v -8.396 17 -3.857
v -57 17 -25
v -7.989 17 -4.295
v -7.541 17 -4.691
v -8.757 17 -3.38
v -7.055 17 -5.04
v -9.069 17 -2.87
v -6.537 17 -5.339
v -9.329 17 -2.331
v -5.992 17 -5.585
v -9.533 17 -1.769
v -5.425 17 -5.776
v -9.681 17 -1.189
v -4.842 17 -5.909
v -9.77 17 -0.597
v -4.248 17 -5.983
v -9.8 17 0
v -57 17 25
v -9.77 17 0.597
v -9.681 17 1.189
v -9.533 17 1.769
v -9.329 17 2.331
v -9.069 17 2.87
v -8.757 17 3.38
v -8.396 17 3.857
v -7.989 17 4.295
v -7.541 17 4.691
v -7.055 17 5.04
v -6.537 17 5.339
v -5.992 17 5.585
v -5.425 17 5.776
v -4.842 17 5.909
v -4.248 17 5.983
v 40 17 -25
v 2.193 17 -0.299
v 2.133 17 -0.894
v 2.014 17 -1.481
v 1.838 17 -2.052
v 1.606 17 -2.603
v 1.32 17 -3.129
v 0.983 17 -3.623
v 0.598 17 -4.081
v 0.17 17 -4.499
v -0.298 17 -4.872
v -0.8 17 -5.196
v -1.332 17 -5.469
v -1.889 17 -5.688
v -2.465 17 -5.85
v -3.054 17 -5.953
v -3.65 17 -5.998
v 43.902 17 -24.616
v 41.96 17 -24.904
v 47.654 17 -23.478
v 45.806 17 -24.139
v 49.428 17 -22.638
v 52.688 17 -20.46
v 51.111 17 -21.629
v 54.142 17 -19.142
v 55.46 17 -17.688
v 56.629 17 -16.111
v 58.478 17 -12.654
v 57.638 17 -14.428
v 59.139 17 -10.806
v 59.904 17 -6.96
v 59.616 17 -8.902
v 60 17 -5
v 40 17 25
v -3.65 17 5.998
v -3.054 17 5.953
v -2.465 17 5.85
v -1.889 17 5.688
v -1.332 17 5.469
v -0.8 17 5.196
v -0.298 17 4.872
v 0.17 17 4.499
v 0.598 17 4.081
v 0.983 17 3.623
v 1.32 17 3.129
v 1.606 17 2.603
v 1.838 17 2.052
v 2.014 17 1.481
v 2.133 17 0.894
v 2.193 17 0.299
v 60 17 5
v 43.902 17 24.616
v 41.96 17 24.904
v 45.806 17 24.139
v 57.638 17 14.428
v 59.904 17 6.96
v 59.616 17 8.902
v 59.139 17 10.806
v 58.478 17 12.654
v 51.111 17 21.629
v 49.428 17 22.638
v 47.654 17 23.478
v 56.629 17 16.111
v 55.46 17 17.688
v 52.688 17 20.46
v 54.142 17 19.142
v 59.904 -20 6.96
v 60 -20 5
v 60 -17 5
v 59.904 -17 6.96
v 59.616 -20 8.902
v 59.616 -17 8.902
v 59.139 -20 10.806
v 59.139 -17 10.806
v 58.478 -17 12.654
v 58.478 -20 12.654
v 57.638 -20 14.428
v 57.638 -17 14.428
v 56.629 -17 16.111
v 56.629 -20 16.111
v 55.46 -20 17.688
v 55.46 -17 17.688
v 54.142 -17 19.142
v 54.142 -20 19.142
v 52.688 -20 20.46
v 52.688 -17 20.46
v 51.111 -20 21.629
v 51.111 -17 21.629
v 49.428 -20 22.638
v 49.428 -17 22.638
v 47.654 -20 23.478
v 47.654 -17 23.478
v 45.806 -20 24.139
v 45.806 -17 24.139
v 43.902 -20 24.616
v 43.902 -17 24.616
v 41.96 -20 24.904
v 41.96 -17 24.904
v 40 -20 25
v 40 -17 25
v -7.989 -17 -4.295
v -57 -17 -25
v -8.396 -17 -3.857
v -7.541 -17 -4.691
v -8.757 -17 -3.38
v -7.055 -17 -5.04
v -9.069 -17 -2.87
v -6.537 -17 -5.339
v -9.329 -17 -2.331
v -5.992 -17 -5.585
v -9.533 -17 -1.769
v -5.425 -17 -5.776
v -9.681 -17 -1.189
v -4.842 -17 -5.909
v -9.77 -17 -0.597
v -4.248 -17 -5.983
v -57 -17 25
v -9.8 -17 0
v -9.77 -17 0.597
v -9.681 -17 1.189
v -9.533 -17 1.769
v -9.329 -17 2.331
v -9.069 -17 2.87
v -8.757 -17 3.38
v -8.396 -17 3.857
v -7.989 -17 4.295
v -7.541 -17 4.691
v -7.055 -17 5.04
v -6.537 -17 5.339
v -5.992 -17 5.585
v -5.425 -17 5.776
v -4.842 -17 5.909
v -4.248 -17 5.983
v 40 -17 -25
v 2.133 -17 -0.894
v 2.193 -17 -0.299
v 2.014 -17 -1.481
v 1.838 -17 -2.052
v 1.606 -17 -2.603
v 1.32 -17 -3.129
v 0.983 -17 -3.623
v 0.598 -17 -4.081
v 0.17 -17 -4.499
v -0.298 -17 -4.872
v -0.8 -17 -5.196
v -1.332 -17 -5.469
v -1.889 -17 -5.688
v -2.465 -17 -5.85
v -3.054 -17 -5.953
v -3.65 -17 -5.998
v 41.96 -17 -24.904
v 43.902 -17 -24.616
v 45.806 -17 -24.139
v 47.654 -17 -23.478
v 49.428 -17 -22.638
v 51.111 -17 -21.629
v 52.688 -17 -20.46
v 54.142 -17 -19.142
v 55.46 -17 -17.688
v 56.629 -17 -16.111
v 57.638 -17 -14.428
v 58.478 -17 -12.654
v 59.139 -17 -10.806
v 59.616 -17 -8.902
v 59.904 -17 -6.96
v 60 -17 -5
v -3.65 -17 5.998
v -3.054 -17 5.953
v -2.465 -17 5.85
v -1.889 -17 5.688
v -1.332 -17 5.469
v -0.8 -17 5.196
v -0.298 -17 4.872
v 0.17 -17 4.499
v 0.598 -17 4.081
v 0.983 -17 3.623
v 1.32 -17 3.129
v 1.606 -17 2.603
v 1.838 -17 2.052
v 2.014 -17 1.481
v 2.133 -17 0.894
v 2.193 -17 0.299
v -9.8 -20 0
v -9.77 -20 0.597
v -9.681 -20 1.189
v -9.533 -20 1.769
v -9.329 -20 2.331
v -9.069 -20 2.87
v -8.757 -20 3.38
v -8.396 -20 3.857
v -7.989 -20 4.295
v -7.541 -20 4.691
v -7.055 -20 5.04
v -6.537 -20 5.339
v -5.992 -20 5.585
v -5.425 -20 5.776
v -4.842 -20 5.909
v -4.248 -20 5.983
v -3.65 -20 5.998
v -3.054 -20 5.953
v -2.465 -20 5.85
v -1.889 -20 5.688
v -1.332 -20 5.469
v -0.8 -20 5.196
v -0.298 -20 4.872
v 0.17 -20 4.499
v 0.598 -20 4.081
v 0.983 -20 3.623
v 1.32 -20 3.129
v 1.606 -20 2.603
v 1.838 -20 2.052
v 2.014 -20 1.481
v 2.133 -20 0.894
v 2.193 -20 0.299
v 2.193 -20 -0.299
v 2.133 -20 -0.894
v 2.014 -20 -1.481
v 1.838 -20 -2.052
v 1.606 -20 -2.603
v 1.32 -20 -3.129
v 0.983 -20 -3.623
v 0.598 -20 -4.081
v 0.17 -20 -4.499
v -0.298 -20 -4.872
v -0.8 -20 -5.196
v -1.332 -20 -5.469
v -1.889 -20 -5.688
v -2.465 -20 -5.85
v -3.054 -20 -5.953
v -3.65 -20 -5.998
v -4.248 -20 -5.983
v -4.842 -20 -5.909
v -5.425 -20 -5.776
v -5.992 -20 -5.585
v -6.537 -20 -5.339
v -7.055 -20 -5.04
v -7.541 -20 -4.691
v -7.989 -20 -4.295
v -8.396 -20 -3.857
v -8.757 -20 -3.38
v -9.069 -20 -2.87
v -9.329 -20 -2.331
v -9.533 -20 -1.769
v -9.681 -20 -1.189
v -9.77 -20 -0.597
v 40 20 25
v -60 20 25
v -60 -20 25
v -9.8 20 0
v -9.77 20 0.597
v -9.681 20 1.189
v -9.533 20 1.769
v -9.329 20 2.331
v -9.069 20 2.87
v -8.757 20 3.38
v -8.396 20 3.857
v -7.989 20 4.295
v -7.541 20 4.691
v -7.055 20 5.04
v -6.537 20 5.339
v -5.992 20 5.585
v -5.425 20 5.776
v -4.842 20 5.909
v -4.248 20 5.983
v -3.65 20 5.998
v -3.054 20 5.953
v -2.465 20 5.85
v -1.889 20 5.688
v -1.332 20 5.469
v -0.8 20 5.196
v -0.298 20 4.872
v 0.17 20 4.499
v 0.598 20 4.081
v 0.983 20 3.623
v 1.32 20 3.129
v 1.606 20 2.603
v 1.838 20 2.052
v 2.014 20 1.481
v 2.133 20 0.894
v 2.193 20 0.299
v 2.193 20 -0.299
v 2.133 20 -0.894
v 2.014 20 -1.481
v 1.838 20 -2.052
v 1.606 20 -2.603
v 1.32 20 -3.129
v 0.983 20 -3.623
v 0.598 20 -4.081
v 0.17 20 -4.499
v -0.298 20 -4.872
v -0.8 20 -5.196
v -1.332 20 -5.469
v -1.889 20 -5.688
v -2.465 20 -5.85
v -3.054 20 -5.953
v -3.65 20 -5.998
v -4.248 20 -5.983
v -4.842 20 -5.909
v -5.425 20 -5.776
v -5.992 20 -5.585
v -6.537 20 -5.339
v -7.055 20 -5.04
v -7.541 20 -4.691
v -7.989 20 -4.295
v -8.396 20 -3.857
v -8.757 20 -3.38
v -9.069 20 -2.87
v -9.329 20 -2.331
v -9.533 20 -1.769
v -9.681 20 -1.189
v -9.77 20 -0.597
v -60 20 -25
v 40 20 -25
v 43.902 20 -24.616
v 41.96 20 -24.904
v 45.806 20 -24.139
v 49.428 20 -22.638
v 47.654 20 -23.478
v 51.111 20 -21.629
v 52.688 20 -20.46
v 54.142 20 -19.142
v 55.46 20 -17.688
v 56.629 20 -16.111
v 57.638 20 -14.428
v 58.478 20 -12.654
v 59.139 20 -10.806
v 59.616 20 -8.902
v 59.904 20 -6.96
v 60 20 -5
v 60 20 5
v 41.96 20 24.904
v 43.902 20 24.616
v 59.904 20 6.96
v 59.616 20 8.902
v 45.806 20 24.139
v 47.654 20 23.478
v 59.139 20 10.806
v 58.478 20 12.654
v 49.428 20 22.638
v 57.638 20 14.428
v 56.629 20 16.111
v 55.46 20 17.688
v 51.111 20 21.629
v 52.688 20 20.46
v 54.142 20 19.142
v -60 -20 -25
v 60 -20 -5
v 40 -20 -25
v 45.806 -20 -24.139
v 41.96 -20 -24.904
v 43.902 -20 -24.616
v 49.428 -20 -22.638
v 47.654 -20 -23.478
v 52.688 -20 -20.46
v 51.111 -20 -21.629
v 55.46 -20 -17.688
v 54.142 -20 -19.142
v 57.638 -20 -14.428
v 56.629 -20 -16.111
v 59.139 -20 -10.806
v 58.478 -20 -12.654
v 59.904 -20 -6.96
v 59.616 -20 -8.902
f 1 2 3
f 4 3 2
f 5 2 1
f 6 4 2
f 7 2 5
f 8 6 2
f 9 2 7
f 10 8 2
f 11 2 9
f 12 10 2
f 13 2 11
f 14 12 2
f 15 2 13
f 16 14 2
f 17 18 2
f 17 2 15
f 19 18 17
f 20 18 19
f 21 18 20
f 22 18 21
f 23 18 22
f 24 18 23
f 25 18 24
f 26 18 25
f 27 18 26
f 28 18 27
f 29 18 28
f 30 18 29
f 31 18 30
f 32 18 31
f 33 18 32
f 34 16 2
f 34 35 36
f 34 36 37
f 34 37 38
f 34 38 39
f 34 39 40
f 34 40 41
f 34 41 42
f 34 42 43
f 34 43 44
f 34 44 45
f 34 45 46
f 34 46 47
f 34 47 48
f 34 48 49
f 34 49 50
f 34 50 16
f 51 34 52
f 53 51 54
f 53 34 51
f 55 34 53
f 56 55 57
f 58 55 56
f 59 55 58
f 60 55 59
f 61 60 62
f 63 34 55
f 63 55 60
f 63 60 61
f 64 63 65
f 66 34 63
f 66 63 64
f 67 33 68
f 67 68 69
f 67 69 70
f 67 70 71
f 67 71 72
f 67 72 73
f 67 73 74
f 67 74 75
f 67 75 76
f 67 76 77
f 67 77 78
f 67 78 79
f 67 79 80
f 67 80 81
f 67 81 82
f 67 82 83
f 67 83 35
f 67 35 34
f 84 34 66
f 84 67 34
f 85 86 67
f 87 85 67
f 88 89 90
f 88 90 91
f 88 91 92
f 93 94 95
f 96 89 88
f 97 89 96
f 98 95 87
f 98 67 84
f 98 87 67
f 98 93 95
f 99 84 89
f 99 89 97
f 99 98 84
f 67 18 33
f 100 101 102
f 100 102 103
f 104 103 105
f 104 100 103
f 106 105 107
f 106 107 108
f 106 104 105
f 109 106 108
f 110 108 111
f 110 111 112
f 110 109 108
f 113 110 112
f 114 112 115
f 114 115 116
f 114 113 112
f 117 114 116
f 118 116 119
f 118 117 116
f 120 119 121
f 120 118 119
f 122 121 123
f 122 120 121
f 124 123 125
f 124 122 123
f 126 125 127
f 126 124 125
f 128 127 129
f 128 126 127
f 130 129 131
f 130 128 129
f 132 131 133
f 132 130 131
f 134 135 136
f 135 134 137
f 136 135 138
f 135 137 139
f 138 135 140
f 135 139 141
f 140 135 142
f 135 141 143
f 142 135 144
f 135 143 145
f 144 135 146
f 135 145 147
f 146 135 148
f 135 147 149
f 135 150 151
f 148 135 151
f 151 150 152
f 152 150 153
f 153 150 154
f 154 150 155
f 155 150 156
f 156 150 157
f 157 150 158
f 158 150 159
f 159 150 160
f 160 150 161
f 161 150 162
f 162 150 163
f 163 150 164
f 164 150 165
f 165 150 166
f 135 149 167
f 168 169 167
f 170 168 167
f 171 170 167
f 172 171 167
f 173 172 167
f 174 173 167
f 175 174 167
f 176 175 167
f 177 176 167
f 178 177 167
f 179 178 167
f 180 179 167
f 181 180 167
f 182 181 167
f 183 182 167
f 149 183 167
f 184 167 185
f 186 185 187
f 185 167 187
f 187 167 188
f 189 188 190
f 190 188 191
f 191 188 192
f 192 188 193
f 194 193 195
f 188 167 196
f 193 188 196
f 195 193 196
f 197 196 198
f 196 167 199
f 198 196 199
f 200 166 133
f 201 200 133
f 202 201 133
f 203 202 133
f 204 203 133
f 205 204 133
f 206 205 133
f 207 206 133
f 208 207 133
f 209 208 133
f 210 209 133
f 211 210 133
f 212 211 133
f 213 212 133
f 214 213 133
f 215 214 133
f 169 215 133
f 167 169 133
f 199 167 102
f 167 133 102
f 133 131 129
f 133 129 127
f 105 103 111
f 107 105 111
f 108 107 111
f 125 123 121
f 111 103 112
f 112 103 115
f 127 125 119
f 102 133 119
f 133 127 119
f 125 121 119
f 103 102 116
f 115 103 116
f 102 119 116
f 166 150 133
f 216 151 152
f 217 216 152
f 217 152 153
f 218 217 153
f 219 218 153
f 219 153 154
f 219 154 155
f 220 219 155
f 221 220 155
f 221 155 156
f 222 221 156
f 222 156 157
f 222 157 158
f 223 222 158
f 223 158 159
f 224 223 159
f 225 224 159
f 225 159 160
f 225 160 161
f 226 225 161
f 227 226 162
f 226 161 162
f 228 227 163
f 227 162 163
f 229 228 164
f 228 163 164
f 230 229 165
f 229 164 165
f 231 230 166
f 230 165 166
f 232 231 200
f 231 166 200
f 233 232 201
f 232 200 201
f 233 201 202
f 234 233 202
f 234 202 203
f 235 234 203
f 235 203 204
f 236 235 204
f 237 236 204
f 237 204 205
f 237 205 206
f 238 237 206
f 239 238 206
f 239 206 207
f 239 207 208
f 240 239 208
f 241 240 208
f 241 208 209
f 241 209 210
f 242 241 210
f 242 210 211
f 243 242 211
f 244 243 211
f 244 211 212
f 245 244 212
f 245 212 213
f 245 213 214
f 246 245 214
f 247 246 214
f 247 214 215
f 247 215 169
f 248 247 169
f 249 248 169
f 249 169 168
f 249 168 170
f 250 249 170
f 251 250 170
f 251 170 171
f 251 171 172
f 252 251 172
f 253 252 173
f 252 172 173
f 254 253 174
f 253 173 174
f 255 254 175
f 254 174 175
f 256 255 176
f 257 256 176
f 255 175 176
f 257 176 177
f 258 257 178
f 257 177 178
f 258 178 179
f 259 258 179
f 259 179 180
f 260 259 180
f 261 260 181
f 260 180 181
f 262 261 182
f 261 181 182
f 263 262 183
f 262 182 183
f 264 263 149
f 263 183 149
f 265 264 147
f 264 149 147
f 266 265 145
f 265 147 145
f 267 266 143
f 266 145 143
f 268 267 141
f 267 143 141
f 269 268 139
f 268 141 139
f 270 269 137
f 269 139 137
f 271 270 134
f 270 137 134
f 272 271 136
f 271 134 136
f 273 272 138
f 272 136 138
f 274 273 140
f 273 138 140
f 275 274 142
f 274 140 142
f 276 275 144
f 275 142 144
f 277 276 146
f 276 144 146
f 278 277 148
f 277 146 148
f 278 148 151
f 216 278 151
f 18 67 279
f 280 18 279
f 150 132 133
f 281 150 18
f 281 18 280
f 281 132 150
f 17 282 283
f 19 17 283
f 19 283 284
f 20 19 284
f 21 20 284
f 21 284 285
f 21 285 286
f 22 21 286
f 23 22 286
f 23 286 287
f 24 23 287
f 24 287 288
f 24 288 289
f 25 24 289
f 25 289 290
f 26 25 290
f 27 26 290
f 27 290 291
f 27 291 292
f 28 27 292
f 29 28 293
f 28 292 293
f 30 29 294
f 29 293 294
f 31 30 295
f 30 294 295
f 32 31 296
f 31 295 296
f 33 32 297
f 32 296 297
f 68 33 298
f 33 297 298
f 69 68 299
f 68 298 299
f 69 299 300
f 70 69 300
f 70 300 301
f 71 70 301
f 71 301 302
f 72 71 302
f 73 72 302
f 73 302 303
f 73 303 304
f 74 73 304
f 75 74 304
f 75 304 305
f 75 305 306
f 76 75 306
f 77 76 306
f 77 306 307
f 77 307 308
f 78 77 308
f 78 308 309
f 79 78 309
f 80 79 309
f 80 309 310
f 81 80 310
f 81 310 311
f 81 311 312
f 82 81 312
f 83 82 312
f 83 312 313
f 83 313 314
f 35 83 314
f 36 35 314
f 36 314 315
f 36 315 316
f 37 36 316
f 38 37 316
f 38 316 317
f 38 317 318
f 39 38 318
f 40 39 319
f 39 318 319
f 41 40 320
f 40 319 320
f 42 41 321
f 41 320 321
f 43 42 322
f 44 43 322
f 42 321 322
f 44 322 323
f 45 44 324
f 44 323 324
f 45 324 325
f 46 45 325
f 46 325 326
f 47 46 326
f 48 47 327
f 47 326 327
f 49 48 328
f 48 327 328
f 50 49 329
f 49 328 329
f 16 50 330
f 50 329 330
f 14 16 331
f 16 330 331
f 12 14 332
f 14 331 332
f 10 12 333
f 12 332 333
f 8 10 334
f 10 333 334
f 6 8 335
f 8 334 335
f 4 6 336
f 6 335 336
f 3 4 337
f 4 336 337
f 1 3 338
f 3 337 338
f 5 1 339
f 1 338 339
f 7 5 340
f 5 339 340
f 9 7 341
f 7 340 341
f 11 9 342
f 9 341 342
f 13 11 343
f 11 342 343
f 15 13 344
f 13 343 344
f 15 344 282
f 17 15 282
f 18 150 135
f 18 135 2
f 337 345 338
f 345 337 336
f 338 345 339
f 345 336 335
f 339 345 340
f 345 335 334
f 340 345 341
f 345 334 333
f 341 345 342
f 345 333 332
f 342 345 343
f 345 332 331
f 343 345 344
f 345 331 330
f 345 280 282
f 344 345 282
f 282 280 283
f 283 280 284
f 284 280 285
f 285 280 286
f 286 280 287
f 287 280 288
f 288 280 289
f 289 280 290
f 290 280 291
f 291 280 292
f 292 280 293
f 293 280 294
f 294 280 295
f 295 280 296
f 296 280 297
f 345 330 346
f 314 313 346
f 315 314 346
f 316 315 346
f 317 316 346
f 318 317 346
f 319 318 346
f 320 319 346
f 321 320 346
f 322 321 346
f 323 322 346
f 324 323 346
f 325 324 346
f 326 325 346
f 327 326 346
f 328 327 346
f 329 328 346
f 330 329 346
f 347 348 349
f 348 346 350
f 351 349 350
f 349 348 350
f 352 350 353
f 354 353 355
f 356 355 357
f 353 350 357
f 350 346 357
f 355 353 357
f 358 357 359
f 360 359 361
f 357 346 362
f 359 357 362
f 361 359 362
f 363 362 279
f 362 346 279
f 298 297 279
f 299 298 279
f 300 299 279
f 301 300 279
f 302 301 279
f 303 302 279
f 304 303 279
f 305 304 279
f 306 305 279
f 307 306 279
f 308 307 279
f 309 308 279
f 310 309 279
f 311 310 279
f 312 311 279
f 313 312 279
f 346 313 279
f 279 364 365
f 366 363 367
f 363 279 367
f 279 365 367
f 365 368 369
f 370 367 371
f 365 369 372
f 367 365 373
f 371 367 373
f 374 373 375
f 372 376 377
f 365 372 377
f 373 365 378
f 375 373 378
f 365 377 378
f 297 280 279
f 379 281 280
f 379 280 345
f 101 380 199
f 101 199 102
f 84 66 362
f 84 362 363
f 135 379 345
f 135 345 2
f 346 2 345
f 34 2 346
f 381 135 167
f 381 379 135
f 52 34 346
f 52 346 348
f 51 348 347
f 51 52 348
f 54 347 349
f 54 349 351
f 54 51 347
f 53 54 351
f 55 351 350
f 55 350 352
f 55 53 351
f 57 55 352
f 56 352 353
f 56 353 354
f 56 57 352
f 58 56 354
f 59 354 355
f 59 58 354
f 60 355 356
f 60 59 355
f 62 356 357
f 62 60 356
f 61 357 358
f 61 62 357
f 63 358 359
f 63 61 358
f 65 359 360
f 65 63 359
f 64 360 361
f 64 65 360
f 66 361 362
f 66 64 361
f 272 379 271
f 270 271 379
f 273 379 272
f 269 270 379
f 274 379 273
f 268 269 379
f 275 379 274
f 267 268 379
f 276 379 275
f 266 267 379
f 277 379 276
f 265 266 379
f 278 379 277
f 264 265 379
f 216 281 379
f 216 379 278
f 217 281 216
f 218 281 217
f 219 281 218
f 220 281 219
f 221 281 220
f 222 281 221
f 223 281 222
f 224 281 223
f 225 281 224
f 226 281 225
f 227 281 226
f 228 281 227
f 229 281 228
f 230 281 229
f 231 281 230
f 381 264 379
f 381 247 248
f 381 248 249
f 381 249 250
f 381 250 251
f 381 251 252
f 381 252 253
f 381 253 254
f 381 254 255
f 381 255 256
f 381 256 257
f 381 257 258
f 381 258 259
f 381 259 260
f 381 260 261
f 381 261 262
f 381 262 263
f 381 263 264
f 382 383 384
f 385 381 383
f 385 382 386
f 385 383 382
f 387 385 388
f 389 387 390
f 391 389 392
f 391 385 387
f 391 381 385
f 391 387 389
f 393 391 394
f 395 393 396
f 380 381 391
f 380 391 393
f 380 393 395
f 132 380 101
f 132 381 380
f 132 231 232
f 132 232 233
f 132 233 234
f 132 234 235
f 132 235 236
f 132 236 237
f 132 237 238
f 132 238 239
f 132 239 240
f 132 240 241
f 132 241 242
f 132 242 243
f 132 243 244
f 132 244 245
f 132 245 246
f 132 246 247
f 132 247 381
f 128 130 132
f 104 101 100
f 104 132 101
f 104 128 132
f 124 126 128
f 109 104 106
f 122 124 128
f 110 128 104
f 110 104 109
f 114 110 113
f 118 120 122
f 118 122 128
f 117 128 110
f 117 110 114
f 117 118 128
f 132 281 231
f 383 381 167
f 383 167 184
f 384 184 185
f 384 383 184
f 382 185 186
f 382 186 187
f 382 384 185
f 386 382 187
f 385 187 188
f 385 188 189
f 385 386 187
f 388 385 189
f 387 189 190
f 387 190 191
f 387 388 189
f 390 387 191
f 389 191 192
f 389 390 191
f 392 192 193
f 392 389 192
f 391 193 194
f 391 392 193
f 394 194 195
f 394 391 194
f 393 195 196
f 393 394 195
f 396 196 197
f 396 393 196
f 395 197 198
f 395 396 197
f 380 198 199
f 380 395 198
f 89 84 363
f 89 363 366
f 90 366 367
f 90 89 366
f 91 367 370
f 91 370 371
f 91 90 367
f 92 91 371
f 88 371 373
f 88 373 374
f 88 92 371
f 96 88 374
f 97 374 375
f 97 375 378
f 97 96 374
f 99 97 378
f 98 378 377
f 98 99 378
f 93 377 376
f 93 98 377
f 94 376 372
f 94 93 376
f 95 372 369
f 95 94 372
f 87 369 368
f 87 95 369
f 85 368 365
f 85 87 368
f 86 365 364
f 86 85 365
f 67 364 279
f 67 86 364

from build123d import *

# Parameters (mm, degrees)
F1_DEPTH = 20
F2_W     = 140
F2_H     = 34
F3_DEPTH = 60
F4_R     = 6
F5_DEPTH = 50


with BuildPart() as f1:
    # F0 (on Front) → F1 (new body, symmetric)
    with BuildSketch(Plane.XZ):
        with BuildLine():
            Line((40, 25), (-60, 25))
            Line((-60, 25), (-60, -25))
            Line((-60, -25), (40, -25))
            ThreePointArc((40, -25), (54.142136, -19.142136), (60, -5))
            Line((60, -5), (60, 5))
            ThreePointArc((60, 5), (54.142136, 19.142136), (40, 25))
        make_face()
    extrude(amount=F1_DEPTH, both=True)

    # F2 (on face) → F3 (cut)
    with BuildSketch(Plane.XY.offset(25)):
        with Locations((13, 0)):
            Rectangle(F2_W, F2_H)
    extrude(amount=-F3_DEPTH, mode=Mode.SUBTRACT)

    # F4 (on face) → F5 (cut)
    with BuildSketch(Plane(origin=(0, 20, 0), x_dir=(-1, 0, 0), z_dir=(0, 1, 0))):
        with Locations((3.8, 0)):
            Circle(F4_R)
    extrude(amount=-F5_DEPTH, mode=Mode.SUBTRACT)


solid = f1.part
